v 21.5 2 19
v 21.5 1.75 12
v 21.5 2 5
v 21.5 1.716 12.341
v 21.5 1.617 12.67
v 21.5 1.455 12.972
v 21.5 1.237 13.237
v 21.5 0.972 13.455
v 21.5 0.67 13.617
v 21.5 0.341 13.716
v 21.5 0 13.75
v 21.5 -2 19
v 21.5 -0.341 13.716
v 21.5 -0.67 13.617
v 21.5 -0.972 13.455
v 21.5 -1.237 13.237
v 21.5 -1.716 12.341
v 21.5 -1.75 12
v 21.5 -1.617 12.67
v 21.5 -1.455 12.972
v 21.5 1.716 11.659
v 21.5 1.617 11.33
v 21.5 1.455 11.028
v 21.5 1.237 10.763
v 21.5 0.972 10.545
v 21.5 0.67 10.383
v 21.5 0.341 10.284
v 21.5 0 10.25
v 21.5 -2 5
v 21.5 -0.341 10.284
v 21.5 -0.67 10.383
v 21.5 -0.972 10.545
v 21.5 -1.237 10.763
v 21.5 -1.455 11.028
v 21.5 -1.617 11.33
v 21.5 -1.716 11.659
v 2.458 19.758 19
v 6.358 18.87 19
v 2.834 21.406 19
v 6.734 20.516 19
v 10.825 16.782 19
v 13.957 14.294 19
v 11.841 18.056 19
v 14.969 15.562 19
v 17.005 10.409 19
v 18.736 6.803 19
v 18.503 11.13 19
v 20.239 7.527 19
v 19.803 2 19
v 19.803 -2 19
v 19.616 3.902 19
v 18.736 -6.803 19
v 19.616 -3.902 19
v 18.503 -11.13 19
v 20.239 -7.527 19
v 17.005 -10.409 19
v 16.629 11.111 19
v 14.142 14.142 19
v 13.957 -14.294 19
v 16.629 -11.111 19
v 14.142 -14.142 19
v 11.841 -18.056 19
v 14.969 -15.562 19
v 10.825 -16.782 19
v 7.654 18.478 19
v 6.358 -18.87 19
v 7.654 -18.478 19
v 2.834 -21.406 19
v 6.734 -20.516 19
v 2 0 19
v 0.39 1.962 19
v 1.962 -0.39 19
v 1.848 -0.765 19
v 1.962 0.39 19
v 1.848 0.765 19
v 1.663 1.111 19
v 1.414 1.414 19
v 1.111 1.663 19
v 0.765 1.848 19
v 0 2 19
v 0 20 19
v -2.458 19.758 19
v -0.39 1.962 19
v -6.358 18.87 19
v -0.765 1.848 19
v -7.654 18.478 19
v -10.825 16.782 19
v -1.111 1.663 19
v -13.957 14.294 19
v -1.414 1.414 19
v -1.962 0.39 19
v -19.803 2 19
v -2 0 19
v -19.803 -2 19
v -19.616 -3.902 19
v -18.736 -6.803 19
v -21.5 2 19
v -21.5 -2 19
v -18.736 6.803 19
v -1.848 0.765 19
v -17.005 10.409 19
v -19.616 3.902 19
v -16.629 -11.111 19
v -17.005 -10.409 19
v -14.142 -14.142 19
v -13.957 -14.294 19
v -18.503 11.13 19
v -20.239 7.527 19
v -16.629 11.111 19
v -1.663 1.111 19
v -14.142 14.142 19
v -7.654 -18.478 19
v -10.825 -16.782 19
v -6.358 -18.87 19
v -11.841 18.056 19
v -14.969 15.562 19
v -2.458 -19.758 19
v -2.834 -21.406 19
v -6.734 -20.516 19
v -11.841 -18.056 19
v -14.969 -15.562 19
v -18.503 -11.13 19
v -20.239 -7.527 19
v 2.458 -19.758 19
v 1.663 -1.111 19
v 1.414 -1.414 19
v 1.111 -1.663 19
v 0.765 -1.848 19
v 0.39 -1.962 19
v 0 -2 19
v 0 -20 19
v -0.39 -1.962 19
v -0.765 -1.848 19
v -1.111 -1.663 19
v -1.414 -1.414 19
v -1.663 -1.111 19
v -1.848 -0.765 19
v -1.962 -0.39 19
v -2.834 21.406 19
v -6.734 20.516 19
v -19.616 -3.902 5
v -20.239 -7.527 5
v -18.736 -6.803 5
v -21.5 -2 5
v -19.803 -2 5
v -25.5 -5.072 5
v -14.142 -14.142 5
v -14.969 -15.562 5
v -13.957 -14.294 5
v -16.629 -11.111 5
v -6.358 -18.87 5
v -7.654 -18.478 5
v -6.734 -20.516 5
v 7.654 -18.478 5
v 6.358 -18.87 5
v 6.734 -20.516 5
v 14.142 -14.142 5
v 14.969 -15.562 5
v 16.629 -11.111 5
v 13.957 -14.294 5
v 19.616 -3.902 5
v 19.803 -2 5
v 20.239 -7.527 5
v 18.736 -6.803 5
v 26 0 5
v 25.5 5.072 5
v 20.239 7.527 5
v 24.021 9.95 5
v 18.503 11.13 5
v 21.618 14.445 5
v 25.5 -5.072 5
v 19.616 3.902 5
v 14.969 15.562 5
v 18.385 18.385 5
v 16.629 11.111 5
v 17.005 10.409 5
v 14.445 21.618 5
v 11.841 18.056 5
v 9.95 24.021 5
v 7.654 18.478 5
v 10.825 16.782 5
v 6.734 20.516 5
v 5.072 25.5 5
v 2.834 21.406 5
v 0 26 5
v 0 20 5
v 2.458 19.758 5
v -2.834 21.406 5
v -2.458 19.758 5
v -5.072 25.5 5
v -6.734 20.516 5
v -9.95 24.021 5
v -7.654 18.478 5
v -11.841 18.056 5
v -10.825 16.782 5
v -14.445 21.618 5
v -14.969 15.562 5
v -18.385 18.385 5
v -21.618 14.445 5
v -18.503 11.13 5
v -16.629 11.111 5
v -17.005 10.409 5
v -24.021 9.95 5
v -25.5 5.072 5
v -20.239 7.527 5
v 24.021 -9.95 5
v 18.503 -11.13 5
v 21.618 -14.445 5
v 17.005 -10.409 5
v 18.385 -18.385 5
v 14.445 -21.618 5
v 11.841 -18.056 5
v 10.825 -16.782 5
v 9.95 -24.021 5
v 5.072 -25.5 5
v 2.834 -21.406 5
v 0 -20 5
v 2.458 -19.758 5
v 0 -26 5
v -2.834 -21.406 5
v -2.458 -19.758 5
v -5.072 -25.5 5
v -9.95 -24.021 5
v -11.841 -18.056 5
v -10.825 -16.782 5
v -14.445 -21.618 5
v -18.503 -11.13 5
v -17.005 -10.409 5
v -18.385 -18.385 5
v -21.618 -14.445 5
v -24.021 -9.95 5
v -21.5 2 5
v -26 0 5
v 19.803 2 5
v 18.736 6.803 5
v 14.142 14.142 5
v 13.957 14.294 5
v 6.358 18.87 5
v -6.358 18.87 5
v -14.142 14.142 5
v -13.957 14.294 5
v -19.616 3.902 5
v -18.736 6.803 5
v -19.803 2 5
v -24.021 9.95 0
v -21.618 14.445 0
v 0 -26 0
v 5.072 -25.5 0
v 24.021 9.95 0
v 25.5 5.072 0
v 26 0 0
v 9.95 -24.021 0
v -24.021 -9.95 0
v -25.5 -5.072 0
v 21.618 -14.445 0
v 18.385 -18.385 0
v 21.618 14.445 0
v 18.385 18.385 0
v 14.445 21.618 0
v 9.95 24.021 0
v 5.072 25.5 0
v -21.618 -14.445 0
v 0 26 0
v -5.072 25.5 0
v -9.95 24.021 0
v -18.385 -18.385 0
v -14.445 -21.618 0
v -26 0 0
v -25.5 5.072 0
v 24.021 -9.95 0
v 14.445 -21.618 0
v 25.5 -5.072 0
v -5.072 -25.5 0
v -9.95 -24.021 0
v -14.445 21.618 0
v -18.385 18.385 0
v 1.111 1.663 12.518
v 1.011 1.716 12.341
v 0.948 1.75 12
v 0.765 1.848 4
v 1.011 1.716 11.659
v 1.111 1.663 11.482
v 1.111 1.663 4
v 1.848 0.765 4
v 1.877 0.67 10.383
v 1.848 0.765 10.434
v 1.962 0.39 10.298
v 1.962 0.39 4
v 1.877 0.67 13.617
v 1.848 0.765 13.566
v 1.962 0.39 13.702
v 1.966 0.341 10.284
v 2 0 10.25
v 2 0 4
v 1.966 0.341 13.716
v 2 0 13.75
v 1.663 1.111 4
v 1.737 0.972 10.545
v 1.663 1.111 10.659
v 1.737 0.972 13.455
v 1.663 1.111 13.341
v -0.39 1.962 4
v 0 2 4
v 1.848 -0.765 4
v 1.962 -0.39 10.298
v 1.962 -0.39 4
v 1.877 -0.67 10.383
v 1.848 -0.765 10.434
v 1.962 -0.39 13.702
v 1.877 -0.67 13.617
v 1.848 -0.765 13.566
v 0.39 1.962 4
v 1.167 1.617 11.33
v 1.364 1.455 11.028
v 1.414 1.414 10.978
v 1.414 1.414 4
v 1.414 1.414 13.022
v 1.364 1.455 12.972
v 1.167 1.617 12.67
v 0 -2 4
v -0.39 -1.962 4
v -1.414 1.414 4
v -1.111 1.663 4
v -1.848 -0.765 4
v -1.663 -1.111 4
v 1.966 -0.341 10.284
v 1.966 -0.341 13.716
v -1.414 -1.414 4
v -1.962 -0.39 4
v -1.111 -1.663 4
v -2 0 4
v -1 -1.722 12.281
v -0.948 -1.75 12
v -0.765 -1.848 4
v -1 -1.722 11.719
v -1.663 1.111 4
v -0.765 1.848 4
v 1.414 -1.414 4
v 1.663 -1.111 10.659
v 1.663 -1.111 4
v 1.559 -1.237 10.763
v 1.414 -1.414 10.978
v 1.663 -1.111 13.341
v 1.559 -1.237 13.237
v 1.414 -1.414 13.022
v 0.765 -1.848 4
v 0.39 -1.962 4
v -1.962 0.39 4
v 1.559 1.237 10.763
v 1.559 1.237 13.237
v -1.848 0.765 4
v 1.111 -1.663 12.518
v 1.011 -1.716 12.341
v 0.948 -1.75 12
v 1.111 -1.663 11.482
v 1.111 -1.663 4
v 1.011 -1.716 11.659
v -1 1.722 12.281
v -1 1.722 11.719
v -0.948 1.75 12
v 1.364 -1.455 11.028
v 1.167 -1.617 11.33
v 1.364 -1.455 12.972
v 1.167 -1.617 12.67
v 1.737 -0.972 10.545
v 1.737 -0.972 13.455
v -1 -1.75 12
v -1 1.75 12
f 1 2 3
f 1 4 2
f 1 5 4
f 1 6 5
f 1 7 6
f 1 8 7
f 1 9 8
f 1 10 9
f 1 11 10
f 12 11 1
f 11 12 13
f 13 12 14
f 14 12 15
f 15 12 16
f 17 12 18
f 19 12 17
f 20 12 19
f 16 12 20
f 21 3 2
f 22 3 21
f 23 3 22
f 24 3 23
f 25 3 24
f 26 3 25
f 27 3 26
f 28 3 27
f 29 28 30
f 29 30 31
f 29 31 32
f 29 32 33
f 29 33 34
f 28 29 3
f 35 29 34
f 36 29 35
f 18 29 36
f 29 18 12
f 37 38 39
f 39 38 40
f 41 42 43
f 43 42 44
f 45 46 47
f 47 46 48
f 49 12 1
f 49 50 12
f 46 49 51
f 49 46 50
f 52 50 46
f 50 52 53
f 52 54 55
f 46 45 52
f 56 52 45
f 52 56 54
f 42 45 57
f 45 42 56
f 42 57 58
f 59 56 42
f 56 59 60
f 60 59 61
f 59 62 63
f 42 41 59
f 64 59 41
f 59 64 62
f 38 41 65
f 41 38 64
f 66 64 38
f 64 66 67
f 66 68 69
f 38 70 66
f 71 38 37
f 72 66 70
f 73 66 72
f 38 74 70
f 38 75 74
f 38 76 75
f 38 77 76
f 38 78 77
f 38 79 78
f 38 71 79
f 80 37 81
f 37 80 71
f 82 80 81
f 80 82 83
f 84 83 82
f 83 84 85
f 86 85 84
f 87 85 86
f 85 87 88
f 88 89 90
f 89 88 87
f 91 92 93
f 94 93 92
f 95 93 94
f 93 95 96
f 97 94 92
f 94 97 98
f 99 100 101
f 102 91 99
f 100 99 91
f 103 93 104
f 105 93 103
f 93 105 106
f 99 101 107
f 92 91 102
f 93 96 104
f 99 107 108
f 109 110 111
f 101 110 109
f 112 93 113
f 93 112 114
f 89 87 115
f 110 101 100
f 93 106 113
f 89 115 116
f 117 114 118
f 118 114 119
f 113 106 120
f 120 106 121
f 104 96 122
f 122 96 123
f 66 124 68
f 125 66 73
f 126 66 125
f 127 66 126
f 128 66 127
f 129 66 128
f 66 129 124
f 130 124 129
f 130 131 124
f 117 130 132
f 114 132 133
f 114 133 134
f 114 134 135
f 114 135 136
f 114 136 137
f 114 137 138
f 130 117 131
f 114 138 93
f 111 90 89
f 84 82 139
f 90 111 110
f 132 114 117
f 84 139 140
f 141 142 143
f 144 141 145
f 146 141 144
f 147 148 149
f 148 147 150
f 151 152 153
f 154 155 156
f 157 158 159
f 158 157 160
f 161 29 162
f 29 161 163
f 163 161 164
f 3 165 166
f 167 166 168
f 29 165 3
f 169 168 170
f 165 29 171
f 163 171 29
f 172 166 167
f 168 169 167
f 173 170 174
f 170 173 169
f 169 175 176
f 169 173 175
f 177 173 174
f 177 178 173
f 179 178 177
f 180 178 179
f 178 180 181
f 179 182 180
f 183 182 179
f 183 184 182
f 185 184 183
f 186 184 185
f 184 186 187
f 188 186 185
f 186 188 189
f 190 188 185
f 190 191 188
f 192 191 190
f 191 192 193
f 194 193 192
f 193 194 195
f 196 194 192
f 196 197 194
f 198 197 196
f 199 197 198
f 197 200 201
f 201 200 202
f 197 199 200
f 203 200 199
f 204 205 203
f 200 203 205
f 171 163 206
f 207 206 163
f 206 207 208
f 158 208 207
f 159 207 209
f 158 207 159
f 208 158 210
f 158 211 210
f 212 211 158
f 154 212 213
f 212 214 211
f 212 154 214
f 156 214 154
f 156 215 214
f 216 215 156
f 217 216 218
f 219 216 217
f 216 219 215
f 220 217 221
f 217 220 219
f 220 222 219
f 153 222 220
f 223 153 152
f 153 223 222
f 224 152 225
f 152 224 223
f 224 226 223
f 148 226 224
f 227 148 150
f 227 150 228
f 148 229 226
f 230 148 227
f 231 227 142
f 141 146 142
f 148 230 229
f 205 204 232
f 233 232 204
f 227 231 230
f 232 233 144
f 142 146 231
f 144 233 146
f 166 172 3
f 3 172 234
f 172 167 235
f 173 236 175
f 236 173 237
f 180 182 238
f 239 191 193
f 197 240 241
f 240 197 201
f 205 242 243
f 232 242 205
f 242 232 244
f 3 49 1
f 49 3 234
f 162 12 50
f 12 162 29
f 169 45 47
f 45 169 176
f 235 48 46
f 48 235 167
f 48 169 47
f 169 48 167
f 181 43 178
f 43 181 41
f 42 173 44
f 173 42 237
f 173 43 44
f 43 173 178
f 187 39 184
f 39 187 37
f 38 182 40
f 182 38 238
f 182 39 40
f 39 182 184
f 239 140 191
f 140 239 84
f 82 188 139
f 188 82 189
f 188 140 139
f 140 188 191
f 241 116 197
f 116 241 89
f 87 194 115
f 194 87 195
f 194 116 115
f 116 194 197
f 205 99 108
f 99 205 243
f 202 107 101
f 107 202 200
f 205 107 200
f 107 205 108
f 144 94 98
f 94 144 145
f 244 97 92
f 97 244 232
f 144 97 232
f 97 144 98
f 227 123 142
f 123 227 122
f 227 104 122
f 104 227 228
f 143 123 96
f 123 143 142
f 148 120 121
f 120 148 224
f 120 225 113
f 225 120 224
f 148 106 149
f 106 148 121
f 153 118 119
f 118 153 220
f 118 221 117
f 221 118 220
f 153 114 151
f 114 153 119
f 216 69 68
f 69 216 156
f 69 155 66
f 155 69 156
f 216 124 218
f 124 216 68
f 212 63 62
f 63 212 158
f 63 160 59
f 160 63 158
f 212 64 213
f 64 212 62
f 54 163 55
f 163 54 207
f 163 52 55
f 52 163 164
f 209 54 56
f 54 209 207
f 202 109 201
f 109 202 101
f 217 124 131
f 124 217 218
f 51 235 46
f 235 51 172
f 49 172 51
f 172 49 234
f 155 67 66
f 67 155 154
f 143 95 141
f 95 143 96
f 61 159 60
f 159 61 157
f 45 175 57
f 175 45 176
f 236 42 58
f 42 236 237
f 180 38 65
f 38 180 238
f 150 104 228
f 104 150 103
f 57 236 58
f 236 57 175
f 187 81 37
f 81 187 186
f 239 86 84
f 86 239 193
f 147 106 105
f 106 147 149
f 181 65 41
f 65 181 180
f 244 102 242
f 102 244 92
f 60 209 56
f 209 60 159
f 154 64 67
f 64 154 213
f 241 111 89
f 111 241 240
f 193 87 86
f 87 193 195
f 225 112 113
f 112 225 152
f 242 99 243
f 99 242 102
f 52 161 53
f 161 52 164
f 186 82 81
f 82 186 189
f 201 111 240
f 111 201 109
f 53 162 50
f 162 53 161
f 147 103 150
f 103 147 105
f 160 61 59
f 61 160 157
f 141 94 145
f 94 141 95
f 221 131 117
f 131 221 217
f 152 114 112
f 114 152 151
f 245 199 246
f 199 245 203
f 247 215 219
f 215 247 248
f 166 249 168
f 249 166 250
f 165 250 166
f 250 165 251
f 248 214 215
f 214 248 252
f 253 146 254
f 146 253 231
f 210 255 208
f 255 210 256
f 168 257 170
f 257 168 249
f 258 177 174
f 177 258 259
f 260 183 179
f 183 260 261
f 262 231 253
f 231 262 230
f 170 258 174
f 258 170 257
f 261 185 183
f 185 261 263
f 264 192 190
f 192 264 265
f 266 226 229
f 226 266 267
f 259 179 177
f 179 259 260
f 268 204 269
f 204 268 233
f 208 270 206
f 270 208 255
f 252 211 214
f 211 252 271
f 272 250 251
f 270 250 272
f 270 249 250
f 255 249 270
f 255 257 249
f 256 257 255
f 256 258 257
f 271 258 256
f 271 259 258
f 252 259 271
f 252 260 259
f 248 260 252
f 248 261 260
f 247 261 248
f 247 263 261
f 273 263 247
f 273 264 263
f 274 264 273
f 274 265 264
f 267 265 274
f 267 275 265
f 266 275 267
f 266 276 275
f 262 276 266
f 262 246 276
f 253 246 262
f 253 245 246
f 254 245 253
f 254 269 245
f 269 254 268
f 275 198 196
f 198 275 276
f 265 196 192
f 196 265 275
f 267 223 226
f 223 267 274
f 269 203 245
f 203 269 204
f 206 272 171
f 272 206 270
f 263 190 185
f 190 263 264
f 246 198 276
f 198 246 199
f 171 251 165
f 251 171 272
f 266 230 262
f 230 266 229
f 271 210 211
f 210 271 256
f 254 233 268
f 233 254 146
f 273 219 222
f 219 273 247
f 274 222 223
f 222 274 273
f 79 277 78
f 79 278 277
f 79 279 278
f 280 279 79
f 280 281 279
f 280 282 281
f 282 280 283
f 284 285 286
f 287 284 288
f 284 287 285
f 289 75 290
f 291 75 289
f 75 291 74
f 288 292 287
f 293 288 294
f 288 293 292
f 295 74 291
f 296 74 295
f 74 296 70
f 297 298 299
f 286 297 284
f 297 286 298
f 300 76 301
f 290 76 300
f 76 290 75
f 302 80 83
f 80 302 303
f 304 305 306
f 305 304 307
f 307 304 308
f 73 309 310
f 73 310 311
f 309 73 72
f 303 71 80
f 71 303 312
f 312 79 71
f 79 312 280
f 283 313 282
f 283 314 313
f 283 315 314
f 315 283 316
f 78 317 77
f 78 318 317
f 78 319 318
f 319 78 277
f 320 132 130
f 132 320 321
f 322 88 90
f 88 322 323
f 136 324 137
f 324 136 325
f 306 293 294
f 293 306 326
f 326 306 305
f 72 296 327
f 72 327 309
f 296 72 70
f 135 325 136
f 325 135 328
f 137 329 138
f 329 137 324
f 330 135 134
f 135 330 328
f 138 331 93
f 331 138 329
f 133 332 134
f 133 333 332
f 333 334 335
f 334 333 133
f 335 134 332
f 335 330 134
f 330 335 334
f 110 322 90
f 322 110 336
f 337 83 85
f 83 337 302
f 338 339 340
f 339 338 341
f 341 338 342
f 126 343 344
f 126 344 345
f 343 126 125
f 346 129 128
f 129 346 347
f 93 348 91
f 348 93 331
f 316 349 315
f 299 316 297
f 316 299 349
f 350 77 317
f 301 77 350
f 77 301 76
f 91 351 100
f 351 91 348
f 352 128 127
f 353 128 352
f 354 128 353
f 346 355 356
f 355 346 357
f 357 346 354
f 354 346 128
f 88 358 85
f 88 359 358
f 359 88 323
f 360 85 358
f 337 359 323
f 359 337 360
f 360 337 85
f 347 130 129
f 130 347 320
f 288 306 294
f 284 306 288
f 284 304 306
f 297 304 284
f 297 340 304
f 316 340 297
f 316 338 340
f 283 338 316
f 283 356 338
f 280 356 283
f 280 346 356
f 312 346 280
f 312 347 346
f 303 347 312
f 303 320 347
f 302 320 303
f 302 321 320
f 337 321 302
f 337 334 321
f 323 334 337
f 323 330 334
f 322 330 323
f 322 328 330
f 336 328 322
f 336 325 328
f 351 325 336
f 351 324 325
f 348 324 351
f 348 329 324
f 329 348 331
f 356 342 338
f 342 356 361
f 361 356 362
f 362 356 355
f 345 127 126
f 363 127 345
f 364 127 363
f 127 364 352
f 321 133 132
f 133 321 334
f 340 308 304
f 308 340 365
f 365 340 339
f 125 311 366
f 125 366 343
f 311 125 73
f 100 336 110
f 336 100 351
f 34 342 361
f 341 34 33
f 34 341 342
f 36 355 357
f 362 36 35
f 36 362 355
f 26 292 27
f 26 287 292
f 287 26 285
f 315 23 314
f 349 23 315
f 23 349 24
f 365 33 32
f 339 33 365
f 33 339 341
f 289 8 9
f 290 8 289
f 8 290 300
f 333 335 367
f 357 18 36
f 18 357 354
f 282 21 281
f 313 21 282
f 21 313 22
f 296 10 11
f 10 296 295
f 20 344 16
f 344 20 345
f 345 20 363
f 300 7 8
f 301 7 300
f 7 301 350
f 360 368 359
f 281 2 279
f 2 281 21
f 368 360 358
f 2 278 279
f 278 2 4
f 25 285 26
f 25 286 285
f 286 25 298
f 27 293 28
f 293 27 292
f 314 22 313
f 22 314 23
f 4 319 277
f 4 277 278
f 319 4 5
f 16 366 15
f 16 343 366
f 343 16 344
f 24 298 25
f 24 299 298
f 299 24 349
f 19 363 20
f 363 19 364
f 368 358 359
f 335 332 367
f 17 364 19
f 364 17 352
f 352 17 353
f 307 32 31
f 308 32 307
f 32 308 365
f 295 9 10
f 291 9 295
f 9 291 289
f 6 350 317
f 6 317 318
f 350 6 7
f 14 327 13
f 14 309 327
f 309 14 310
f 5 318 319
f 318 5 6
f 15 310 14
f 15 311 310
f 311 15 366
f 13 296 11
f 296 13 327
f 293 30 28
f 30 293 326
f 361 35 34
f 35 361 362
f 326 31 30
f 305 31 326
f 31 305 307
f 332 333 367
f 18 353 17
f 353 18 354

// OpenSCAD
$fn = 32;

// ----------------------------------------------------------------------
// Control knob: skirt knob with grip ribs
// ----------------------------------------------------------------------

// --- parameters (mm) ---
skirt_d = 52;             // skirt diameter
skirt_t = 5;              // skirt thickness
rib_w = 4;                // grip rib width
rib_out = 2.5;            // grip rib radial protrusion
n_ribs = 14;              // number of grip ribs
knob_d = 40;              // knob body diameter
knob_h = 14;              // knob body height
bore_d = 4;               // shaft bore diameter
set_d = 3.5;              // set screw bore diameter
fit_tol = 0.1;            // tolerance for press fits, mm
free_tol = 0.3;           // tolerance for clearance fits, mm

rib_step = 360 / n_ribs;  // rib angular step
total_h = skirt_t + knob_h;  // overall height

difference() {
  union() {
    translate([0, 0, skirt_t]) cylinder(h = knob_h, d = knob_d);
    cylinder(h = skirt_t, d = skirt_d);
    for (i = [0 : n_ribs - 1])
      rotate([0, 0, i * rib_step])
        translate([knob_d / 2 - 1, -rib_w / 2, skirt_t])
          cube([rib_out, rib_w, knob_h]);
  }
  translate([0, 0, skirt_t - 1]) cylinder(h = knob_h + 2, d = bore_d);
  translate([-1, 0, skirt_t + knob_h / 2]) rotate([0, 90, 0])
    cylinder(h = knob_d / 2 + bore_d / 2 + 2, d = set_d);
}
